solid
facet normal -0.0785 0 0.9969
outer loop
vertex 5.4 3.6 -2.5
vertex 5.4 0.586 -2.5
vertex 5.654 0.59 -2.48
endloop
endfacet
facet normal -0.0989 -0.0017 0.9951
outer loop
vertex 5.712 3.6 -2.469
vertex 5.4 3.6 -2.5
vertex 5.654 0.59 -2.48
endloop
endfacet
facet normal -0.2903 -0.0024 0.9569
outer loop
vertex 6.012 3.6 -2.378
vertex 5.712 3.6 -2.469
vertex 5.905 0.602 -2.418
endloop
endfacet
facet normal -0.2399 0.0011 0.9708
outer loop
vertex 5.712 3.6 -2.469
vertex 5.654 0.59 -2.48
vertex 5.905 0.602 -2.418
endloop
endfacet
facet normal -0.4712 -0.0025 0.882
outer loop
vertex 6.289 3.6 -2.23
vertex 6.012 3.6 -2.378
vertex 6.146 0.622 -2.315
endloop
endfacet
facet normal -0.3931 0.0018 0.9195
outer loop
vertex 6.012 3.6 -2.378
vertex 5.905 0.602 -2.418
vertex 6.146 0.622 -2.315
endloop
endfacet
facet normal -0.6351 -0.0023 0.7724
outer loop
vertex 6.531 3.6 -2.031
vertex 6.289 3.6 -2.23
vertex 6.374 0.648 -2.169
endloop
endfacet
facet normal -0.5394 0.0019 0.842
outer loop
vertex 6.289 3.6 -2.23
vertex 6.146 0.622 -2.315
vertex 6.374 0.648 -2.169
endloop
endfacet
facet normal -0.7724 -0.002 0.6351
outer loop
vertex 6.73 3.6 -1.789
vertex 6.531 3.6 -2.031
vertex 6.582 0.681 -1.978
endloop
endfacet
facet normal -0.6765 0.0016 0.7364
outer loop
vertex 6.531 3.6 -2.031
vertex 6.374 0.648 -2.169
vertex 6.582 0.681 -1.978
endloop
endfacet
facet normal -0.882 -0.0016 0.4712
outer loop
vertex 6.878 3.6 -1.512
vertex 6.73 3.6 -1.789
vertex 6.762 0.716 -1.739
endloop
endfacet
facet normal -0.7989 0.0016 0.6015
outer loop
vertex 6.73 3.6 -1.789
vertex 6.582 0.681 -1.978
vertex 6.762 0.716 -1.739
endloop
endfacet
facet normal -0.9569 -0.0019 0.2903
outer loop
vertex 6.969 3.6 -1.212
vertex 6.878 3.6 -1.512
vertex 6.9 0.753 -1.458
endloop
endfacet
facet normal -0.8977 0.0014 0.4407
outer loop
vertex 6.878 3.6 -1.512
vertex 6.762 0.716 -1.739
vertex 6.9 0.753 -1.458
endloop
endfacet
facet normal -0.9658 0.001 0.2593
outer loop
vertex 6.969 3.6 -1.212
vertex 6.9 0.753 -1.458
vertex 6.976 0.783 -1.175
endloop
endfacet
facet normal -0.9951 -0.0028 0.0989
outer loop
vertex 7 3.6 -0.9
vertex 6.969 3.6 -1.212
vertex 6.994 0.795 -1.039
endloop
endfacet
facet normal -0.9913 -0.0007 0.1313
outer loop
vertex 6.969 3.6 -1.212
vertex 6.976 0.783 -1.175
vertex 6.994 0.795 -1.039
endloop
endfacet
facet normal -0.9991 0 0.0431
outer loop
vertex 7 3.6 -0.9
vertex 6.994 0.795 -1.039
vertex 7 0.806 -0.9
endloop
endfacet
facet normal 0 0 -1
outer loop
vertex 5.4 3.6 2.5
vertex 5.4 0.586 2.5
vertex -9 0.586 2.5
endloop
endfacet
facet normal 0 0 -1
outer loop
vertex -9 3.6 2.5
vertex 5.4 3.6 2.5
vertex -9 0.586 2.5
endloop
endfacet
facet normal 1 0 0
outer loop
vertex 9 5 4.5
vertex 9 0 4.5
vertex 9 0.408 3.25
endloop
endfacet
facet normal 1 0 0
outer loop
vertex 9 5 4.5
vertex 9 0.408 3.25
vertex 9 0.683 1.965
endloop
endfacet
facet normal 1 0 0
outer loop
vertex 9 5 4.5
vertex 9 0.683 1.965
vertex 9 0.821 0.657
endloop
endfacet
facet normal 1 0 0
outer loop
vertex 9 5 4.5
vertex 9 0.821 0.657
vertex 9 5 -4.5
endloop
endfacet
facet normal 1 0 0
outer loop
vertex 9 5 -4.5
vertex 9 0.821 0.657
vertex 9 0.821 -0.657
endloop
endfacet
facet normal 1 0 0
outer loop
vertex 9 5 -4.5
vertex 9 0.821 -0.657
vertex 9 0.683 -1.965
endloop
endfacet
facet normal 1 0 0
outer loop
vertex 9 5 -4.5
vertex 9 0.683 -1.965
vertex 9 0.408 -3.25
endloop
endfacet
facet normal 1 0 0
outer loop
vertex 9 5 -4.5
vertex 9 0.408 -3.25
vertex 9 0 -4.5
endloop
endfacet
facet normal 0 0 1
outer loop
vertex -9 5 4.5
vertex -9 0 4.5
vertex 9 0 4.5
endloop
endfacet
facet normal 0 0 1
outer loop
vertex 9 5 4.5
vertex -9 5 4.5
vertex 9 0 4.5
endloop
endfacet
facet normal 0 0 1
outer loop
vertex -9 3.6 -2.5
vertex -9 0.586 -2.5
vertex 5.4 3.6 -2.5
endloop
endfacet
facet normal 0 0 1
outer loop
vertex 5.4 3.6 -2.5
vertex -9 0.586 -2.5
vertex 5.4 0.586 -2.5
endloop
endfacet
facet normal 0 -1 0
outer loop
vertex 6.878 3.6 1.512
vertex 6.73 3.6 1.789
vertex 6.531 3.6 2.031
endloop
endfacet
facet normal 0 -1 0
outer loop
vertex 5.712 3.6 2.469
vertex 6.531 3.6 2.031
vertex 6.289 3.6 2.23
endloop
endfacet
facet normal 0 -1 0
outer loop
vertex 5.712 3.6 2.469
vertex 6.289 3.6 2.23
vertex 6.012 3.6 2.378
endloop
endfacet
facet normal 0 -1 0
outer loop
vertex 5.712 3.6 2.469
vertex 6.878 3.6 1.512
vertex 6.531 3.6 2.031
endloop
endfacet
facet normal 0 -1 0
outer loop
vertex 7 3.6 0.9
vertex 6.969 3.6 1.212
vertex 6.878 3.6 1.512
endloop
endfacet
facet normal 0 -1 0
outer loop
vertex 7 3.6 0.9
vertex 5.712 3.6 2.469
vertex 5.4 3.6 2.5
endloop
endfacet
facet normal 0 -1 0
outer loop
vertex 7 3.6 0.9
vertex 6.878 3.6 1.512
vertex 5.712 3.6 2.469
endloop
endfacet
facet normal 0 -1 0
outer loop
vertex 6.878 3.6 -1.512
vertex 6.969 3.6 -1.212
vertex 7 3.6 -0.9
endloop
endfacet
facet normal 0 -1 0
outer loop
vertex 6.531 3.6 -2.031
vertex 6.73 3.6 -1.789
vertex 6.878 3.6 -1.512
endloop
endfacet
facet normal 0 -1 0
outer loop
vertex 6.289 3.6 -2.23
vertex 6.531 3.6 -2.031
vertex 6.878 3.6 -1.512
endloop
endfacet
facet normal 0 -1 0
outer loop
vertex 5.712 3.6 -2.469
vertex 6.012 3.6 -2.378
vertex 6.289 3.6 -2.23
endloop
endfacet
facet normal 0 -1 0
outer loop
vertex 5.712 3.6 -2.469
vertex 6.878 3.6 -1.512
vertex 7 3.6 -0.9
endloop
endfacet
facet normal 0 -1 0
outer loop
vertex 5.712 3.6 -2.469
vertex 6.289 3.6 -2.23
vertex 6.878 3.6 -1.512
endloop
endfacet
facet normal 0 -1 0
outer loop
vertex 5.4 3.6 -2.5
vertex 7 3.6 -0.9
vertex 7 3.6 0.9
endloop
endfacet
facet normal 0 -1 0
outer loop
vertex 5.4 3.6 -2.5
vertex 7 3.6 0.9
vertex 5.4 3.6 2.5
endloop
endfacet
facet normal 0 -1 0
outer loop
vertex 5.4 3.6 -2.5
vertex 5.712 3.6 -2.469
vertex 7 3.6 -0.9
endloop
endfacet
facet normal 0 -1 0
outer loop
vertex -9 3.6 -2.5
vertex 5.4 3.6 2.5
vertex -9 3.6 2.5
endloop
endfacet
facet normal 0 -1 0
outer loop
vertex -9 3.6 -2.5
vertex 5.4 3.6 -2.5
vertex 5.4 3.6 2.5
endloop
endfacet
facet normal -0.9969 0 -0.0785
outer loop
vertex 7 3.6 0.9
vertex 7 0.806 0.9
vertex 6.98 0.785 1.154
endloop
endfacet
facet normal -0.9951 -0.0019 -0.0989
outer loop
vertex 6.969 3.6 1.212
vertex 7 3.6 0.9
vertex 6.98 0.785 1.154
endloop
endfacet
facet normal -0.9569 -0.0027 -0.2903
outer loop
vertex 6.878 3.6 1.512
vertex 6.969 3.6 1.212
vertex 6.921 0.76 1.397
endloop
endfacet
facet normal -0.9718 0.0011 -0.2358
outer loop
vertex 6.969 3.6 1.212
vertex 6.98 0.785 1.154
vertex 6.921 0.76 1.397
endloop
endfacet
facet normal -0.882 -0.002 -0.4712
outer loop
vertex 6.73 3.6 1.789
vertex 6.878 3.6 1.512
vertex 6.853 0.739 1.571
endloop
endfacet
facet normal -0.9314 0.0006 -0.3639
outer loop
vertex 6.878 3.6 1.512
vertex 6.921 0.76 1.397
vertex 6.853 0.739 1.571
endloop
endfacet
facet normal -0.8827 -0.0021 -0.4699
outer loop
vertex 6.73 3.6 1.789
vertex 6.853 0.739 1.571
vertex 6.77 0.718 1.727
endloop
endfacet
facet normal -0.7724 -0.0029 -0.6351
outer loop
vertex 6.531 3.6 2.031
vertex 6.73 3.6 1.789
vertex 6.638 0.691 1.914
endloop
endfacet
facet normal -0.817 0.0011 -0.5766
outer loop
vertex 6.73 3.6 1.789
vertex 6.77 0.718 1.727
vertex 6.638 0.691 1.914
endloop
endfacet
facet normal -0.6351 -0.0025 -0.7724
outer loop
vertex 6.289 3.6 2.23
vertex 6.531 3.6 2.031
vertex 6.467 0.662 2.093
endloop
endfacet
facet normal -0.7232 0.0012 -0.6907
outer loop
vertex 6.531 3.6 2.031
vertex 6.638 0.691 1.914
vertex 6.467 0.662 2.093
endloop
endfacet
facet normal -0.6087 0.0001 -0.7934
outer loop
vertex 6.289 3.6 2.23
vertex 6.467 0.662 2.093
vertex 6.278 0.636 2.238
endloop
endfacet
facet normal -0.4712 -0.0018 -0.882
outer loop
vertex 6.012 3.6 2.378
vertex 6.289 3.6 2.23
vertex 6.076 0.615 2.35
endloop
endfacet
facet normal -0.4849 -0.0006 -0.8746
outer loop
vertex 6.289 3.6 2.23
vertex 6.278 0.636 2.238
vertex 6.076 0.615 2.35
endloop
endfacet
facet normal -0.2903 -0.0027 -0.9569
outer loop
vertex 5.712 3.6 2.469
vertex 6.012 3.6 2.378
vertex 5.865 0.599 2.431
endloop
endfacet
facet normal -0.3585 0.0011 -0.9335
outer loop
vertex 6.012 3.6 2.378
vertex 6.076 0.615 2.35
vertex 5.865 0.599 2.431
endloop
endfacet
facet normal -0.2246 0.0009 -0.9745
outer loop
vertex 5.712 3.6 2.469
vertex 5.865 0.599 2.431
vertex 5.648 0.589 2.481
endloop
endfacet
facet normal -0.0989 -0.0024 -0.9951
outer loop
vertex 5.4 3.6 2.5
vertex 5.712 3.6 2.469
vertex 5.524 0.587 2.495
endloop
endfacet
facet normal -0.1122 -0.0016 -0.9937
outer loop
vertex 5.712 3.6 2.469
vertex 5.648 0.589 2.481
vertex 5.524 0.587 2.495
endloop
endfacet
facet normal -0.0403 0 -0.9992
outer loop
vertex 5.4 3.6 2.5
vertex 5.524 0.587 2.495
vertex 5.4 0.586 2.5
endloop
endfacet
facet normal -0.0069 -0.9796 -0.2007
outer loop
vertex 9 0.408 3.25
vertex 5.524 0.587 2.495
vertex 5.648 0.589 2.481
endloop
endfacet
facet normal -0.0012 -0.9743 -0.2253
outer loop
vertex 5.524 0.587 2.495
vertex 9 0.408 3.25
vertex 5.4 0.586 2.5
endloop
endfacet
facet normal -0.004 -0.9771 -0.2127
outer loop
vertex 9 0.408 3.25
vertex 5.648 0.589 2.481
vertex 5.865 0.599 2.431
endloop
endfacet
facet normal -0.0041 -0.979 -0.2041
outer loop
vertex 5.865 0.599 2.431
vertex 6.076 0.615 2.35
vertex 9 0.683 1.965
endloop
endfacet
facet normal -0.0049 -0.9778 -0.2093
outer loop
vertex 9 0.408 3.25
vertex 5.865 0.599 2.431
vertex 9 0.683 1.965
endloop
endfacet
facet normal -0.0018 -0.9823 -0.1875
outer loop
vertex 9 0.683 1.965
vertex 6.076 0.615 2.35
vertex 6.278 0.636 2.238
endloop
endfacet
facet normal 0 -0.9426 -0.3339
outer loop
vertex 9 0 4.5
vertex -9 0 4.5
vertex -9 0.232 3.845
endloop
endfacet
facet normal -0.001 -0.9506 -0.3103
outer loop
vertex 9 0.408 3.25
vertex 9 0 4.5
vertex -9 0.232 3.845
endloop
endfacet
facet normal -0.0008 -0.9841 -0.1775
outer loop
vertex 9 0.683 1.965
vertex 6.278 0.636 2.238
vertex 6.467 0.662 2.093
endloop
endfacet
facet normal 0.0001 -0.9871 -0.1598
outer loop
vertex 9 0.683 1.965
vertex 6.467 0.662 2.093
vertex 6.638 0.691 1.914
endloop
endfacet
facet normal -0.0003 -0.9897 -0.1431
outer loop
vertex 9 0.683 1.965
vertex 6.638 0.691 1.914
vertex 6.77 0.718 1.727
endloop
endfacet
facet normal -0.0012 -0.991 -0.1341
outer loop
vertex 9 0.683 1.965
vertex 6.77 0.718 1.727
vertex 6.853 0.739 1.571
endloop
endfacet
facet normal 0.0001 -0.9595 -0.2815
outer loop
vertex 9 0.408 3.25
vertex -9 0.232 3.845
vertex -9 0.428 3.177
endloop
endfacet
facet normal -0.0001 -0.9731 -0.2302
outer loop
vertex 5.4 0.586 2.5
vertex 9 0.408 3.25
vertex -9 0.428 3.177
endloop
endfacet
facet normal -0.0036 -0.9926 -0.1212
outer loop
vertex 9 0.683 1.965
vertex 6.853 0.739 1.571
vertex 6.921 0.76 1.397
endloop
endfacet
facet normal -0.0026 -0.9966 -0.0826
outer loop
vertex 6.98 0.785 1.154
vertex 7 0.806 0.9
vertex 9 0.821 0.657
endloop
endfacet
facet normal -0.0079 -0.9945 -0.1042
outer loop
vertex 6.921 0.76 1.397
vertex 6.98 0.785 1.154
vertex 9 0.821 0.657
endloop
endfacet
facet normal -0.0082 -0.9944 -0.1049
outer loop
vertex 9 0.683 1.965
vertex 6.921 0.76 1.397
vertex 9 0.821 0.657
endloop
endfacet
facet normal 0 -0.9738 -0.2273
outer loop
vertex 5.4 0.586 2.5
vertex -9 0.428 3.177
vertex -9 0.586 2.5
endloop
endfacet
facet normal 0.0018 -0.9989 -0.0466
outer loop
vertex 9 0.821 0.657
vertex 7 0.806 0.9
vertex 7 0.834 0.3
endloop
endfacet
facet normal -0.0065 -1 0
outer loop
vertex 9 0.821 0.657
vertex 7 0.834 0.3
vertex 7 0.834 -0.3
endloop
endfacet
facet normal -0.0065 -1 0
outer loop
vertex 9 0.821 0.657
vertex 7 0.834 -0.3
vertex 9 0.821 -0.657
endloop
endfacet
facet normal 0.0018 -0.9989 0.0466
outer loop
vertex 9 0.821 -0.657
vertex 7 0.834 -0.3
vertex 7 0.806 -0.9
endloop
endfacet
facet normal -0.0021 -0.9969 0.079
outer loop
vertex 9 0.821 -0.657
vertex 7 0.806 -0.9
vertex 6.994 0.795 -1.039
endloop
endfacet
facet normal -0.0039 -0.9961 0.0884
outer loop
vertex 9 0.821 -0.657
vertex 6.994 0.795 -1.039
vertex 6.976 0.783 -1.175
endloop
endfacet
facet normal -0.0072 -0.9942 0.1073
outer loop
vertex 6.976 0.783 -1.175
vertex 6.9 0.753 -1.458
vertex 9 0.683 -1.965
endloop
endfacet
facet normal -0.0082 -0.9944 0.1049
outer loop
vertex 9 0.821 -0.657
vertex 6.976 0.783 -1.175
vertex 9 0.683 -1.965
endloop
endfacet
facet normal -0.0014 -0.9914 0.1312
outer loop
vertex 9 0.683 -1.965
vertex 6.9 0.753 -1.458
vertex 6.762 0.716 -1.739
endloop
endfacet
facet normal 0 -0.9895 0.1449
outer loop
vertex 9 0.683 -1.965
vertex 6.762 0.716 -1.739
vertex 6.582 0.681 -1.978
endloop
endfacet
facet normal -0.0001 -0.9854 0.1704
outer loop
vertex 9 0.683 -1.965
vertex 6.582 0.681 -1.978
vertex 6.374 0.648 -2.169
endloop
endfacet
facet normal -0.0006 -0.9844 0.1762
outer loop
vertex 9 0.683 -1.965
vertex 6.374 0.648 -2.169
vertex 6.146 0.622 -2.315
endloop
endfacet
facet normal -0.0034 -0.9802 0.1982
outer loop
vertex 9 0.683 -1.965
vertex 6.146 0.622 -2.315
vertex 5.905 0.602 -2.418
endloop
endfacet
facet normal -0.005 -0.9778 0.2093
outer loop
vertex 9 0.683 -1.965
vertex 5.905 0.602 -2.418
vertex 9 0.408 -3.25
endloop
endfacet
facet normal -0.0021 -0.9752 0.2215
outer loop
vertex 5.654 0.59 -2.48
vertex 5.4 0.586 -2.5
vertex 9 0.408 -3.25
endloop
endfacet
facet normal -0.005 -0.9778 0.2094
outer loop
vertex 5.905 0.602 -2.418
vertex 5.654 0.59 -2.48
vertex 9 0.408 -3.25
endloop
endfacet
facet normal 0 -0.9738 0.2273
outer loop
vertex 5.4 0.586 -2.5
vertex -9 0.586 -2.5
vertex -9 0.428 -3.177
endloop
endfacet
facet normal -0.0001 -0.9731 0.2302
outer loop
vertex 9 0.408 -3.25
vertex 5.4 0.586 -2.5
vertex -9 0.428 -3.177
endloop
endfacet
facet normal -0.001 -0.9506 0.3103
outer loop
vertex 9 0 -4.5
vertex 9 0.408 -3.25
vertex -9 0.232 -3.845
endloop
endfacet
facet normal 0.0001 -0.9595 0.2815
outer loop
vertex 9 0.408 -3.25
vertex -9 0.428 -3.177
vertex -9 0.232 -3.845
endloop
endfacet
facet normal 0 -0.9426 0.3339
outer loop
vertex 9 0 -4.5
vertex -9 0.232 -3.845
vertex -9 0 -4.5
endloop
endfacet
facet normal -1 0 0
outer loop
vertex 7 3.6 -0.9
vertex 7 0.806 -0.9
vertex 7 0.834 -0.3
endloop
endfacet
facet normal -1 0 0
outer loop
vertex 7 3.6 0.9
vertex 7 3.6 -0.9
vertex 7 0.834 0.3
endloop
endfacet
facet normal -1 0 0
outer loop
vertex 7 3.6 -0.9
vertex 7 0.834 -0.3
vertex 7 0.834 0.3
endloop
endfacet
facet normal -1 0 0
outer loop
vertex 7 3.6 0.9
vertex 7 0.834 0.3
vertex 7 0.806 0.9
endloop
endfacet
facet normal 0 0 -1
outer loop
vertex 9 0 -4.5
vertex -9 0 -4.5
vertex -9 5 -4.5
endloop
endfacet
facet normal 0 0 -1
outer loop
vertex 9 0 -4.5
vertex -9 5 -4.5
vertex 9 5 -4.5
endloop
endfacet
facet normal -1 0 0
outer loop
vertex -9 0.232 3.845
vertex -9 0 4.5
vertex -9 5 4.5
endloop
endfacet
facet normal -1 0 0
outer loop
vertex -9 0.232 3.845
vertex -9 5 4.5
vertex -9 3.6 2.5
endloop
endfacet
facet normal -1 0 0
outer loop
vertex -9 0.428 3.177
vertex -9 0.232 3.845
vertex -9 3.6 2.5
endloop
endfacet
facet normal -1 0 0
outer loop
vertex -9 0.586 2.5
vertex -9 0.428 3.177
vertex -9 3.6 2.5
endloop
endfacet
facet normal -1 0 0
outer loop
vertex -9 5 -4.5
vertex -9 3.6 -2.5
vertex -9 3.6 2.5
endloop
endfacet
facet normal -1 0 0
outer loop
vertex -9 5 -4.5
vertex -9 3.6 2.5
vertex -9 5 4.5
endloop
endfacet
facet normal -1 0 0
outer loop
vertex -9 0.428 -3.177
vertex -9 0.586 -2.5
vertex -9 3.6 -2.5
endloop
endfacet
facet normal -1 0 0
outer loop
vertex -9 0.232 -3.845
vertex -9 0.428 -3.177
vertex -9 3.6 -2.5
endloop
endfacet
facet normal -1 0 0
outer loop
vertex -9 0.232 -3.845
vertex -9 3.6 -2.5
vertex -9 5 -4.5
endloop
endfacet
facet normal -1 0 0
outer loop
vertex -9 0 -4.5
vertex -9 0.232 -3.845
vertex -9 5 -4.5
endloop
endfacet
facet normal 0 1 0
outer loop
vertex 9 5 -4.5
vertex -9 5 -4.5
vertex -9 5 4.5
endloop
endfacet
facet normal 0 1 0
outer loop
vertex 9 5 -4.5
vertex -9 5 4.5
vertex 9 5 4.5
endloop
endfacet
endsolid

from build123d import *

# Parameters (mm, degrees)
SKETCH1_W           = 18
SKETCH1_H           = 9
BOSS_EXTRUDE1_DEPTH = 5
CUT_EXTRUDE1_DEPTH  = 20.215878851
CUT_EXTRUDE3_DEPTH  = 3.6


with BuildPart() as part:
    # Sketch1 → Boss-Extrude1 (new body)
    with BuildSketch(Plane(origin=(0, 0, 0), x_dir=(1, 0, 0), z_dir=(0, 1, 0))):
        Rectangle(SKETCH1_W, SKETCH1_H)
    extrude(amount=BOSS_EXTRUDE1_DEPTH)

    # Sketch2 → Cut-Extrude1 (cut, through all)
    with BuildSketch(Plane.ZY.offset(9)):
        with BuildLine():
            Line((-4.5, 0), (4.5, 0))
            ThreePointArc((4.5, 0), (0, 0.83809621), (-4.5, 0))
        make_face()
    extrude(amount=-CUT_EXTRUDE1_DEPTH, mode=Mode.SUBTRACT)

    # Sketch3 → Cut-Extrude3 (cut)
    with BuildSketch(Plane(origin=(0, 0, 0), x_dir=(1, 0, 0), z_dir=(0, 1, 0))):
        with BuildLine():
            Line((-9, 2.5), (5.4, 2.5))
            ThreePointArc((5.4, 2.5), (6.53137085, 2.03137085), (7, 0.9))
            Line((7, 0.9), (7, -0.9))
            ThreePointArc((7, -0.9), (6.53137085, -2.03137085), (5.4, -2.5))
            Line((5.4, -2.5), (-9, -2.5))
            Line((-9, -2.5), (-9, 2.5))
        make_face()
    extrude(amount=CUT_EXTRUDE3_DEPTH, mode=Mode.SUBTRACT)


solid = part.part
